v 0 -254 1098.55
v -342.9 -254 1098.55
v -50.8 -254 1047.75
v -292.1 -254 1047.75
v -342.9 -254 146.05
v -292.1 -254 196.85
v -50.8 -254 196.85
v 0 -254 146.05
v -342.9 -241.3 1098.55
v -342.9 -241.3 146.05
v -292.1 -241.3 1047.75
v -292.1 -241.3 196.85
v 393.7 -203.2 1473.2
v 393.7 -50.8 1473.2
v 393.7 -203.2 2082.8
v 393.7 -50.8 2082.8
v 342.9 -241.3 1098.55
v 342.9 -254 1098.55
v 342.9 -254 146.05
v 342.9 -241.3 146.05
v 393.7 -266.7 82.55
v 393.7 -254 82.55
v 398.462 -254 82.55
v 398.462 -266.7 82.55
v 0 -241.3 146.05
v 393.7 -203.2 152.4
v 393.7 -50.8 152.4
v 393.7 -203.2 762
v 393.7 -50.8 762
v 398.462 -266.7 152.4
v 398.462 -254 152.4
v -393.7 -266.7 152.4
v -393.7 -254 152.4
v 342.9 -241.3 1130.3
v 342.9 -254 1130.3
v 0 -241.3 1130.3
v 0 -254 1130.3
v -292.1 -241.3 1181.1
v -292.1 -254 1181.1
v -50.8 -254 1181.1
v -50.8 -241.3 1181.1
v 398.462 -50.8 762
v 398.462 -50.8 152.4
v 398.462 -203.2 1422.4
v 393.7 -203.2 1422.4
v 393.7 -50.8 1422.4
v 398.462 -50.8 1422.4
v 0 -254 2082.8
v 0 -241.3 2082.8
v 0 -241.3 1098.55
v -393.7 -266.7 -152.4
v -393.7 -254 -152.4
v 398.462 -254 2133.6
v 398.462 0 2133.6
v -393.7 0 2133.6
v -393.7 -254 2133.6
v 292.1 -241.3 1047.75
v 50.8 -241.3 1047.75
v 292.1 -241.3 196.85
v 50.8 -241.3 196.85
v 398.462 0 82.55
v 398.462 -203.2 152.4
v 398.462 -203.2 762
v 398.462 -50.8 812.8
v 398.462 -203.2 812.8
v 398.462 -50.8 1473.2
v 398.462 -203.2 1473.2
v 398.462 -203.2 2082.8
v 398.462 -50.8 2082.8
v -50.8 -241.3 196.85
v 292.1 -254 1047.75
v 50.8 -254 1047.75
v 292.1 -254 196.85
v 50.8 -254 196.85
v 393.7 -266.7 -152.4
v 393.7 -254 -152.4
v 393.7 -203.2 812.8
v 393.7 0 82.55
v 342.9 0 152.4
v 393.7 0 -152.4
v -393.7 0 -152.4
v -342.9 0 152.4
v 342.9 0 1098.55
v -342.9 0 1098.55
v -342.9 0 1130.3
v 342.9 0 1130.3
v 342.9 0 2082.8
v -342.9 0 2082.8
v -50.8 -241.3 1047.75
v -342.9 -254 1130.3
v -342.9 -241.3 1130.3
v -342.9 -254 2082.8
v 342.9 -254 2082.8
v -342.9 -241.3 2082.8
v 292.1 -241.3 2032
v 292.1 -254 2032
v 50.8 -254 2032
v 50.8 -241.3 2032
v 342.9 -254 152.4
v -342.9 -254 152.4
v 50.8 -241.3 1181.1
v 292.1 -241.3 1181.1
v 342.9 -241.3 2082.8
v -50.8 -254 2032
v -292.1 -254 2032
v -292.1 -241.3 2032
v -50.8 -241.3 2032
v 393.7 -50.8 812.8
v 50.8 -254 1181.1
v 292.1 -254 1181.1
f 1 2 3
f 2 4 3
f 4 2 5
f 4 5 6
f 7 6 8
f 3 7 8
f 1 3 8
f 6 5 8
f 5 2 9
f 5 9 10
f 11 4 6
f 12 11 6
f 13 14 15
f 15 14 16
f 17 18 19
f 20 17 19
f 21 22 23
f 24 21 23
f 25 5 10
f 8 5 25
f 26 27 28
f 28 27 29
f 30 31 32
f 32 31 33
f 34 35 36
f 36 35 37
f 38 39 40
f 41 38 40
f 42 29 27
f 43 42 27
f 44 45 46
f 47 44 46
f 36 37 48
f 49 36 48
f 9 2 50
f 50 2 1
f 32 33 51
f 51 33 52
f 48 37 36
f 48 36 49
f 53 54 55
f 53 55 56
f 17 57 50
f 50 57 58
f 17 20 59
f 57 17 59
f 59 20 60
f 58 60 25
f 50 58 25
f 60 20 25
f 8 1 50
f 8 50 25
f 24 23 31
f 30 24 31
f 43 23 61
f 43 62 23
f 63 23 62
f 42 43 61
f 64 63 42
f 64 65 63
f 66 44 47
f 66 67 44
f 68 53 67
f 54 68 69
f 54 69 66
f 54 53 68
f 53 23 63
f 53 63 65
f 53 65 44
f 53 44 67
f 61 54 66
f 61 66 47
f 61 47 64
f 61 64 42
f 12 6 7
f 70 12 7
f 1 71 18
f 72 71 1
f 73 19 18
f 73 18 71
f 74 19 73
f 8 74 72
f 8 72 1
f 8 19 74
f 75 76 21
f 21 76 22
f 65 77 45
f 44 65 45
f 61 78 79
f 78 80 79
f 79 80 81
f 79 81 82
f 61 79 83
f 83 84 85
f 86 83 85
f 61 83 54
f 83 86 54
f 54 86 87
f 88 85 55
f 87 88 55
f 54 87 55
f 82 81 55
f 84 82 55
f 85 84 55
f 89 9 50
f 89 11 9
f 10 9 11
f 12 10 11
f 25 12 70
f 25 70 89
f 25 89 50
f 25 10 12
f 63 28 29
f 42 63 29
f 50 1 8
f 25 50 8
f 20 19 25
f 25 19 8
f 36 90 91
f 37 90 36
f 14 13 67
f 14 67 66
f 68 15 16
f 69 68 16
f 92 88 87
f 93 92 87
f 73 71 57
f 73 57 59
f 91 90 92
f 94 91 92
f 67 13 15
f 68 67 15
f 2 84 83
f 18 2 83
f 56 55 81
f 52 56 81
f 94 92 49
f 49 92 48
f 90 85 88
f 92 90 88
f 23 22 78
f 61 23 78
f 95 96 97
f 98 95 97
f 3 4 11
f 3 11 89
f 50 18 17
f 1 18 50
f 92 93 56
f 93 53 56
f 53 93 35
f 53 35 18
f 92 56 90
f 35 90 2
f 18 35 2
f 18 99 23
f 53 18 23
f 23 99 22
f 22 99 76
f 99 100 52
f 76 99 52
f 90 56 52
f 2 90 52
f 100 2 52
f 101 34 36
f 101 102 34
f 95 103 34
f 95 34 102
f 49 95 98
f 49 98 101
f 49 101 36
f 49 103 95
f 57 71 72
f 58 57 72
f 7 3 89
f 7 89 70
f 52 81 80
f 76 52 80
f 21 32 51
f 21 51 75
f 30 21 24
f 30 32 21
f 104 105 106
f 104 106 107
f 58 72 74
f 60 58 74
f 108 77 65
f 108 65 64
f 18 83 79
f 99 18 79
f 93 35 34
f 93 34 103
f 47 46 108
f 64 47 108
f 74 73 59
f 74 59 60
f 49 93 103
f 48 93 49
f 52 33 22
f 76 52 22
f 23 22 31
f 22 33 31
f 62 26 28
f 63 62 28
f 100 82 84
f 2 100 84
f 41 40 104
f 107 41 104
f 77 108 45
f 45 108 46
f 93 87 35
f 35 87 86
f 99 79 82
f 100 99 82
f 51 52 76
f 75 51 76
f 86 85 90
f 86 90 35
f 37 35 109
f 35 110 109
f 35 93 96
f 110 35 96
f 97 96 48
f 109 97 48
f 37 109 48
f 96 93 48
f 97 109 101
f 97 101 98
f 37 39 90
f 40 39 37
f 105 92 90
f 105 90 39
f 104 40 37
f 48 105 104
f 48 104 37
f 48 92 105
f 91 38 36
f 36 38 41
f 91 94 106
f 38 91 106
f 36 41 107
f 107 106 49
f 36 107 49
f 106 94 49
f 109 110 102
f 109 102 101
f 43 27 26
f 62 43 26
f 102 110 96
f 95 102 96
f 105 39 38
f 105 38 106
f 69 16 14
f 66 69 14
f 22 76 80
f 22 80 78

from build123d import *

# Parameters (mm, degrees)
F0_W      = 685.8
F0_H      = 31.75
F1_DEPTH  = 254
F2_W      = 152.4
F2_H      = 50.8
F3_DEPTH  = 4.7625
F4_W      = 342.9
F4_H      = 952.5
F4_W_2    = 241.3
F4_H_2    = 850.9
F5_DEPTH  = 12.7
F11_DEPTH = 12.7


with BuildPart() as f1:
    # F0 (on Front) → F1 (new body)
    with BuildSketch(Plane.XZ):
        Polygon((342.9, 2082.8), (393.7, 2082.8), (393.7, 2133.6), (342.9, 2133.6), (-342.9, 2133.6), (-393.7, 2133.6), (-393.7, 2082.8), (-342.9, 2082.8), align=None)
        with Locations((0, 1114.425)):
            Rectangle(F0_W, F0_H)
        Polygon((-393.7, 152.4), (-342.9, 152.4), (-342.9, 1098.55), (-342.9, 1130.3), (-342.9, 2082.8), (-393.7, 2082.8), align=None)
        Polygon((342.9, 152.4), (393.7, 152.4), (393.7, 2082.8), (342.9, 2082.8), (342.9, 1130.3), (342.9, 1098.55), align=None)
        Polygon((393.7, -152.4), (393.7, 152.4), (342.9, 152.4), (-342.9, 152.4), (-393.7, 152.4), (-393.7, -152.4), align=None)
    extrude(amount=F1_DEPTH)

    # F2 (on face) → F3 (join)
    with BuildSketch(Plane.YZ.offset(393.7)):
        Polygon((0, 2133.6), (-254, 2133.6), (-254, 2082.8), (-203.2, 2082.8), (-50.8, 2082.8), (0, 2082.8), align=None)
        Polygon((-203.2, 2082.8), (-254, 2082.8), (-254, 152.4), (-203.2, 152.4), (-203.2, 762), (-203.2, 812.8), (-203.2, 1422.4), (-203.2, 1473.2), align=None)
        Polygon((0, 152.4), (0, 2082.8), (-50.8, 2082.8), (-50.8, 1473.2), (-50.8, 1422.4), (-50.8, 812.8), (-50.8, 762), (-50.8, 152.4), align=None)
        Polygon((-203.2, 152.4), (-254, 152.4), (-254, 82.55), (-50.8, 82.55), (0, 82.55), (0, 152.4), (-50.8, 152.4), align=None)
        with Locations((-127, 787.4)):
            Rectangle(F2_W, F2_H)
        with Locations((-127, 1447.8)):
            Rectangle(F2_W, F2_H)
    extrude(amount=F3_DEPTH)


with BuildPart() as f5:
    # F4 (on face) → F5 (new body)
    with BuildSketch(Plane.XZ.offset(254)):
        with Locations((-171.45, 1606.55)):
            Rectangle(F4_W, F4_H)
        with Locations((-171.45, 1606.55)):
            Rectangle(F4_W_2, F4_H_2, mode=Mode.SUBTRACT)
    extrude(amount=-F5_DEPTH)


with BuildPart() as f7_1:
    # F7: instance of F5
    add(f5.part.mirror(Plane(origin=(0, -247.65, 1606.55), x_dir=(0, 1, 0), z_dir=(1, 0, 0))))


with BuildPart() as f9_1:
    # F9: instance of F5
    add(f5.part.mirror(Plane(origin=(0, -127, 1114.425), x_dir=(1, 0, 0), z_dir=(0, 0, 1))))


with BuildPart() as f9_2:
    # F9: instance of F7_1
    add(f7_1.part.mirror(Plane(origin=(0, -127, 1114.425), x_dir=(1, 0, 0), z_dir=(0, 0, 1))))


with BuildPart() as f11:
    # F10 (on face) → F11 (new body)
    with BuildSketch(Plane.XZ.offset(254)):
        Polygon((-393.7, 152.4), (-393.7, -152.4), (393.7, -152.4), (393.7, 82.55), (398.4625, 82.55), (398.4625, 152.4), (342.9, 152.4), (-342.9, 152.4), align=None)
    extrude(amount=F11_DEPTH)


solid = Compound([f1.part, f5.part, f7_1.part, f9_1.part, f9_2.part, f11.part])
